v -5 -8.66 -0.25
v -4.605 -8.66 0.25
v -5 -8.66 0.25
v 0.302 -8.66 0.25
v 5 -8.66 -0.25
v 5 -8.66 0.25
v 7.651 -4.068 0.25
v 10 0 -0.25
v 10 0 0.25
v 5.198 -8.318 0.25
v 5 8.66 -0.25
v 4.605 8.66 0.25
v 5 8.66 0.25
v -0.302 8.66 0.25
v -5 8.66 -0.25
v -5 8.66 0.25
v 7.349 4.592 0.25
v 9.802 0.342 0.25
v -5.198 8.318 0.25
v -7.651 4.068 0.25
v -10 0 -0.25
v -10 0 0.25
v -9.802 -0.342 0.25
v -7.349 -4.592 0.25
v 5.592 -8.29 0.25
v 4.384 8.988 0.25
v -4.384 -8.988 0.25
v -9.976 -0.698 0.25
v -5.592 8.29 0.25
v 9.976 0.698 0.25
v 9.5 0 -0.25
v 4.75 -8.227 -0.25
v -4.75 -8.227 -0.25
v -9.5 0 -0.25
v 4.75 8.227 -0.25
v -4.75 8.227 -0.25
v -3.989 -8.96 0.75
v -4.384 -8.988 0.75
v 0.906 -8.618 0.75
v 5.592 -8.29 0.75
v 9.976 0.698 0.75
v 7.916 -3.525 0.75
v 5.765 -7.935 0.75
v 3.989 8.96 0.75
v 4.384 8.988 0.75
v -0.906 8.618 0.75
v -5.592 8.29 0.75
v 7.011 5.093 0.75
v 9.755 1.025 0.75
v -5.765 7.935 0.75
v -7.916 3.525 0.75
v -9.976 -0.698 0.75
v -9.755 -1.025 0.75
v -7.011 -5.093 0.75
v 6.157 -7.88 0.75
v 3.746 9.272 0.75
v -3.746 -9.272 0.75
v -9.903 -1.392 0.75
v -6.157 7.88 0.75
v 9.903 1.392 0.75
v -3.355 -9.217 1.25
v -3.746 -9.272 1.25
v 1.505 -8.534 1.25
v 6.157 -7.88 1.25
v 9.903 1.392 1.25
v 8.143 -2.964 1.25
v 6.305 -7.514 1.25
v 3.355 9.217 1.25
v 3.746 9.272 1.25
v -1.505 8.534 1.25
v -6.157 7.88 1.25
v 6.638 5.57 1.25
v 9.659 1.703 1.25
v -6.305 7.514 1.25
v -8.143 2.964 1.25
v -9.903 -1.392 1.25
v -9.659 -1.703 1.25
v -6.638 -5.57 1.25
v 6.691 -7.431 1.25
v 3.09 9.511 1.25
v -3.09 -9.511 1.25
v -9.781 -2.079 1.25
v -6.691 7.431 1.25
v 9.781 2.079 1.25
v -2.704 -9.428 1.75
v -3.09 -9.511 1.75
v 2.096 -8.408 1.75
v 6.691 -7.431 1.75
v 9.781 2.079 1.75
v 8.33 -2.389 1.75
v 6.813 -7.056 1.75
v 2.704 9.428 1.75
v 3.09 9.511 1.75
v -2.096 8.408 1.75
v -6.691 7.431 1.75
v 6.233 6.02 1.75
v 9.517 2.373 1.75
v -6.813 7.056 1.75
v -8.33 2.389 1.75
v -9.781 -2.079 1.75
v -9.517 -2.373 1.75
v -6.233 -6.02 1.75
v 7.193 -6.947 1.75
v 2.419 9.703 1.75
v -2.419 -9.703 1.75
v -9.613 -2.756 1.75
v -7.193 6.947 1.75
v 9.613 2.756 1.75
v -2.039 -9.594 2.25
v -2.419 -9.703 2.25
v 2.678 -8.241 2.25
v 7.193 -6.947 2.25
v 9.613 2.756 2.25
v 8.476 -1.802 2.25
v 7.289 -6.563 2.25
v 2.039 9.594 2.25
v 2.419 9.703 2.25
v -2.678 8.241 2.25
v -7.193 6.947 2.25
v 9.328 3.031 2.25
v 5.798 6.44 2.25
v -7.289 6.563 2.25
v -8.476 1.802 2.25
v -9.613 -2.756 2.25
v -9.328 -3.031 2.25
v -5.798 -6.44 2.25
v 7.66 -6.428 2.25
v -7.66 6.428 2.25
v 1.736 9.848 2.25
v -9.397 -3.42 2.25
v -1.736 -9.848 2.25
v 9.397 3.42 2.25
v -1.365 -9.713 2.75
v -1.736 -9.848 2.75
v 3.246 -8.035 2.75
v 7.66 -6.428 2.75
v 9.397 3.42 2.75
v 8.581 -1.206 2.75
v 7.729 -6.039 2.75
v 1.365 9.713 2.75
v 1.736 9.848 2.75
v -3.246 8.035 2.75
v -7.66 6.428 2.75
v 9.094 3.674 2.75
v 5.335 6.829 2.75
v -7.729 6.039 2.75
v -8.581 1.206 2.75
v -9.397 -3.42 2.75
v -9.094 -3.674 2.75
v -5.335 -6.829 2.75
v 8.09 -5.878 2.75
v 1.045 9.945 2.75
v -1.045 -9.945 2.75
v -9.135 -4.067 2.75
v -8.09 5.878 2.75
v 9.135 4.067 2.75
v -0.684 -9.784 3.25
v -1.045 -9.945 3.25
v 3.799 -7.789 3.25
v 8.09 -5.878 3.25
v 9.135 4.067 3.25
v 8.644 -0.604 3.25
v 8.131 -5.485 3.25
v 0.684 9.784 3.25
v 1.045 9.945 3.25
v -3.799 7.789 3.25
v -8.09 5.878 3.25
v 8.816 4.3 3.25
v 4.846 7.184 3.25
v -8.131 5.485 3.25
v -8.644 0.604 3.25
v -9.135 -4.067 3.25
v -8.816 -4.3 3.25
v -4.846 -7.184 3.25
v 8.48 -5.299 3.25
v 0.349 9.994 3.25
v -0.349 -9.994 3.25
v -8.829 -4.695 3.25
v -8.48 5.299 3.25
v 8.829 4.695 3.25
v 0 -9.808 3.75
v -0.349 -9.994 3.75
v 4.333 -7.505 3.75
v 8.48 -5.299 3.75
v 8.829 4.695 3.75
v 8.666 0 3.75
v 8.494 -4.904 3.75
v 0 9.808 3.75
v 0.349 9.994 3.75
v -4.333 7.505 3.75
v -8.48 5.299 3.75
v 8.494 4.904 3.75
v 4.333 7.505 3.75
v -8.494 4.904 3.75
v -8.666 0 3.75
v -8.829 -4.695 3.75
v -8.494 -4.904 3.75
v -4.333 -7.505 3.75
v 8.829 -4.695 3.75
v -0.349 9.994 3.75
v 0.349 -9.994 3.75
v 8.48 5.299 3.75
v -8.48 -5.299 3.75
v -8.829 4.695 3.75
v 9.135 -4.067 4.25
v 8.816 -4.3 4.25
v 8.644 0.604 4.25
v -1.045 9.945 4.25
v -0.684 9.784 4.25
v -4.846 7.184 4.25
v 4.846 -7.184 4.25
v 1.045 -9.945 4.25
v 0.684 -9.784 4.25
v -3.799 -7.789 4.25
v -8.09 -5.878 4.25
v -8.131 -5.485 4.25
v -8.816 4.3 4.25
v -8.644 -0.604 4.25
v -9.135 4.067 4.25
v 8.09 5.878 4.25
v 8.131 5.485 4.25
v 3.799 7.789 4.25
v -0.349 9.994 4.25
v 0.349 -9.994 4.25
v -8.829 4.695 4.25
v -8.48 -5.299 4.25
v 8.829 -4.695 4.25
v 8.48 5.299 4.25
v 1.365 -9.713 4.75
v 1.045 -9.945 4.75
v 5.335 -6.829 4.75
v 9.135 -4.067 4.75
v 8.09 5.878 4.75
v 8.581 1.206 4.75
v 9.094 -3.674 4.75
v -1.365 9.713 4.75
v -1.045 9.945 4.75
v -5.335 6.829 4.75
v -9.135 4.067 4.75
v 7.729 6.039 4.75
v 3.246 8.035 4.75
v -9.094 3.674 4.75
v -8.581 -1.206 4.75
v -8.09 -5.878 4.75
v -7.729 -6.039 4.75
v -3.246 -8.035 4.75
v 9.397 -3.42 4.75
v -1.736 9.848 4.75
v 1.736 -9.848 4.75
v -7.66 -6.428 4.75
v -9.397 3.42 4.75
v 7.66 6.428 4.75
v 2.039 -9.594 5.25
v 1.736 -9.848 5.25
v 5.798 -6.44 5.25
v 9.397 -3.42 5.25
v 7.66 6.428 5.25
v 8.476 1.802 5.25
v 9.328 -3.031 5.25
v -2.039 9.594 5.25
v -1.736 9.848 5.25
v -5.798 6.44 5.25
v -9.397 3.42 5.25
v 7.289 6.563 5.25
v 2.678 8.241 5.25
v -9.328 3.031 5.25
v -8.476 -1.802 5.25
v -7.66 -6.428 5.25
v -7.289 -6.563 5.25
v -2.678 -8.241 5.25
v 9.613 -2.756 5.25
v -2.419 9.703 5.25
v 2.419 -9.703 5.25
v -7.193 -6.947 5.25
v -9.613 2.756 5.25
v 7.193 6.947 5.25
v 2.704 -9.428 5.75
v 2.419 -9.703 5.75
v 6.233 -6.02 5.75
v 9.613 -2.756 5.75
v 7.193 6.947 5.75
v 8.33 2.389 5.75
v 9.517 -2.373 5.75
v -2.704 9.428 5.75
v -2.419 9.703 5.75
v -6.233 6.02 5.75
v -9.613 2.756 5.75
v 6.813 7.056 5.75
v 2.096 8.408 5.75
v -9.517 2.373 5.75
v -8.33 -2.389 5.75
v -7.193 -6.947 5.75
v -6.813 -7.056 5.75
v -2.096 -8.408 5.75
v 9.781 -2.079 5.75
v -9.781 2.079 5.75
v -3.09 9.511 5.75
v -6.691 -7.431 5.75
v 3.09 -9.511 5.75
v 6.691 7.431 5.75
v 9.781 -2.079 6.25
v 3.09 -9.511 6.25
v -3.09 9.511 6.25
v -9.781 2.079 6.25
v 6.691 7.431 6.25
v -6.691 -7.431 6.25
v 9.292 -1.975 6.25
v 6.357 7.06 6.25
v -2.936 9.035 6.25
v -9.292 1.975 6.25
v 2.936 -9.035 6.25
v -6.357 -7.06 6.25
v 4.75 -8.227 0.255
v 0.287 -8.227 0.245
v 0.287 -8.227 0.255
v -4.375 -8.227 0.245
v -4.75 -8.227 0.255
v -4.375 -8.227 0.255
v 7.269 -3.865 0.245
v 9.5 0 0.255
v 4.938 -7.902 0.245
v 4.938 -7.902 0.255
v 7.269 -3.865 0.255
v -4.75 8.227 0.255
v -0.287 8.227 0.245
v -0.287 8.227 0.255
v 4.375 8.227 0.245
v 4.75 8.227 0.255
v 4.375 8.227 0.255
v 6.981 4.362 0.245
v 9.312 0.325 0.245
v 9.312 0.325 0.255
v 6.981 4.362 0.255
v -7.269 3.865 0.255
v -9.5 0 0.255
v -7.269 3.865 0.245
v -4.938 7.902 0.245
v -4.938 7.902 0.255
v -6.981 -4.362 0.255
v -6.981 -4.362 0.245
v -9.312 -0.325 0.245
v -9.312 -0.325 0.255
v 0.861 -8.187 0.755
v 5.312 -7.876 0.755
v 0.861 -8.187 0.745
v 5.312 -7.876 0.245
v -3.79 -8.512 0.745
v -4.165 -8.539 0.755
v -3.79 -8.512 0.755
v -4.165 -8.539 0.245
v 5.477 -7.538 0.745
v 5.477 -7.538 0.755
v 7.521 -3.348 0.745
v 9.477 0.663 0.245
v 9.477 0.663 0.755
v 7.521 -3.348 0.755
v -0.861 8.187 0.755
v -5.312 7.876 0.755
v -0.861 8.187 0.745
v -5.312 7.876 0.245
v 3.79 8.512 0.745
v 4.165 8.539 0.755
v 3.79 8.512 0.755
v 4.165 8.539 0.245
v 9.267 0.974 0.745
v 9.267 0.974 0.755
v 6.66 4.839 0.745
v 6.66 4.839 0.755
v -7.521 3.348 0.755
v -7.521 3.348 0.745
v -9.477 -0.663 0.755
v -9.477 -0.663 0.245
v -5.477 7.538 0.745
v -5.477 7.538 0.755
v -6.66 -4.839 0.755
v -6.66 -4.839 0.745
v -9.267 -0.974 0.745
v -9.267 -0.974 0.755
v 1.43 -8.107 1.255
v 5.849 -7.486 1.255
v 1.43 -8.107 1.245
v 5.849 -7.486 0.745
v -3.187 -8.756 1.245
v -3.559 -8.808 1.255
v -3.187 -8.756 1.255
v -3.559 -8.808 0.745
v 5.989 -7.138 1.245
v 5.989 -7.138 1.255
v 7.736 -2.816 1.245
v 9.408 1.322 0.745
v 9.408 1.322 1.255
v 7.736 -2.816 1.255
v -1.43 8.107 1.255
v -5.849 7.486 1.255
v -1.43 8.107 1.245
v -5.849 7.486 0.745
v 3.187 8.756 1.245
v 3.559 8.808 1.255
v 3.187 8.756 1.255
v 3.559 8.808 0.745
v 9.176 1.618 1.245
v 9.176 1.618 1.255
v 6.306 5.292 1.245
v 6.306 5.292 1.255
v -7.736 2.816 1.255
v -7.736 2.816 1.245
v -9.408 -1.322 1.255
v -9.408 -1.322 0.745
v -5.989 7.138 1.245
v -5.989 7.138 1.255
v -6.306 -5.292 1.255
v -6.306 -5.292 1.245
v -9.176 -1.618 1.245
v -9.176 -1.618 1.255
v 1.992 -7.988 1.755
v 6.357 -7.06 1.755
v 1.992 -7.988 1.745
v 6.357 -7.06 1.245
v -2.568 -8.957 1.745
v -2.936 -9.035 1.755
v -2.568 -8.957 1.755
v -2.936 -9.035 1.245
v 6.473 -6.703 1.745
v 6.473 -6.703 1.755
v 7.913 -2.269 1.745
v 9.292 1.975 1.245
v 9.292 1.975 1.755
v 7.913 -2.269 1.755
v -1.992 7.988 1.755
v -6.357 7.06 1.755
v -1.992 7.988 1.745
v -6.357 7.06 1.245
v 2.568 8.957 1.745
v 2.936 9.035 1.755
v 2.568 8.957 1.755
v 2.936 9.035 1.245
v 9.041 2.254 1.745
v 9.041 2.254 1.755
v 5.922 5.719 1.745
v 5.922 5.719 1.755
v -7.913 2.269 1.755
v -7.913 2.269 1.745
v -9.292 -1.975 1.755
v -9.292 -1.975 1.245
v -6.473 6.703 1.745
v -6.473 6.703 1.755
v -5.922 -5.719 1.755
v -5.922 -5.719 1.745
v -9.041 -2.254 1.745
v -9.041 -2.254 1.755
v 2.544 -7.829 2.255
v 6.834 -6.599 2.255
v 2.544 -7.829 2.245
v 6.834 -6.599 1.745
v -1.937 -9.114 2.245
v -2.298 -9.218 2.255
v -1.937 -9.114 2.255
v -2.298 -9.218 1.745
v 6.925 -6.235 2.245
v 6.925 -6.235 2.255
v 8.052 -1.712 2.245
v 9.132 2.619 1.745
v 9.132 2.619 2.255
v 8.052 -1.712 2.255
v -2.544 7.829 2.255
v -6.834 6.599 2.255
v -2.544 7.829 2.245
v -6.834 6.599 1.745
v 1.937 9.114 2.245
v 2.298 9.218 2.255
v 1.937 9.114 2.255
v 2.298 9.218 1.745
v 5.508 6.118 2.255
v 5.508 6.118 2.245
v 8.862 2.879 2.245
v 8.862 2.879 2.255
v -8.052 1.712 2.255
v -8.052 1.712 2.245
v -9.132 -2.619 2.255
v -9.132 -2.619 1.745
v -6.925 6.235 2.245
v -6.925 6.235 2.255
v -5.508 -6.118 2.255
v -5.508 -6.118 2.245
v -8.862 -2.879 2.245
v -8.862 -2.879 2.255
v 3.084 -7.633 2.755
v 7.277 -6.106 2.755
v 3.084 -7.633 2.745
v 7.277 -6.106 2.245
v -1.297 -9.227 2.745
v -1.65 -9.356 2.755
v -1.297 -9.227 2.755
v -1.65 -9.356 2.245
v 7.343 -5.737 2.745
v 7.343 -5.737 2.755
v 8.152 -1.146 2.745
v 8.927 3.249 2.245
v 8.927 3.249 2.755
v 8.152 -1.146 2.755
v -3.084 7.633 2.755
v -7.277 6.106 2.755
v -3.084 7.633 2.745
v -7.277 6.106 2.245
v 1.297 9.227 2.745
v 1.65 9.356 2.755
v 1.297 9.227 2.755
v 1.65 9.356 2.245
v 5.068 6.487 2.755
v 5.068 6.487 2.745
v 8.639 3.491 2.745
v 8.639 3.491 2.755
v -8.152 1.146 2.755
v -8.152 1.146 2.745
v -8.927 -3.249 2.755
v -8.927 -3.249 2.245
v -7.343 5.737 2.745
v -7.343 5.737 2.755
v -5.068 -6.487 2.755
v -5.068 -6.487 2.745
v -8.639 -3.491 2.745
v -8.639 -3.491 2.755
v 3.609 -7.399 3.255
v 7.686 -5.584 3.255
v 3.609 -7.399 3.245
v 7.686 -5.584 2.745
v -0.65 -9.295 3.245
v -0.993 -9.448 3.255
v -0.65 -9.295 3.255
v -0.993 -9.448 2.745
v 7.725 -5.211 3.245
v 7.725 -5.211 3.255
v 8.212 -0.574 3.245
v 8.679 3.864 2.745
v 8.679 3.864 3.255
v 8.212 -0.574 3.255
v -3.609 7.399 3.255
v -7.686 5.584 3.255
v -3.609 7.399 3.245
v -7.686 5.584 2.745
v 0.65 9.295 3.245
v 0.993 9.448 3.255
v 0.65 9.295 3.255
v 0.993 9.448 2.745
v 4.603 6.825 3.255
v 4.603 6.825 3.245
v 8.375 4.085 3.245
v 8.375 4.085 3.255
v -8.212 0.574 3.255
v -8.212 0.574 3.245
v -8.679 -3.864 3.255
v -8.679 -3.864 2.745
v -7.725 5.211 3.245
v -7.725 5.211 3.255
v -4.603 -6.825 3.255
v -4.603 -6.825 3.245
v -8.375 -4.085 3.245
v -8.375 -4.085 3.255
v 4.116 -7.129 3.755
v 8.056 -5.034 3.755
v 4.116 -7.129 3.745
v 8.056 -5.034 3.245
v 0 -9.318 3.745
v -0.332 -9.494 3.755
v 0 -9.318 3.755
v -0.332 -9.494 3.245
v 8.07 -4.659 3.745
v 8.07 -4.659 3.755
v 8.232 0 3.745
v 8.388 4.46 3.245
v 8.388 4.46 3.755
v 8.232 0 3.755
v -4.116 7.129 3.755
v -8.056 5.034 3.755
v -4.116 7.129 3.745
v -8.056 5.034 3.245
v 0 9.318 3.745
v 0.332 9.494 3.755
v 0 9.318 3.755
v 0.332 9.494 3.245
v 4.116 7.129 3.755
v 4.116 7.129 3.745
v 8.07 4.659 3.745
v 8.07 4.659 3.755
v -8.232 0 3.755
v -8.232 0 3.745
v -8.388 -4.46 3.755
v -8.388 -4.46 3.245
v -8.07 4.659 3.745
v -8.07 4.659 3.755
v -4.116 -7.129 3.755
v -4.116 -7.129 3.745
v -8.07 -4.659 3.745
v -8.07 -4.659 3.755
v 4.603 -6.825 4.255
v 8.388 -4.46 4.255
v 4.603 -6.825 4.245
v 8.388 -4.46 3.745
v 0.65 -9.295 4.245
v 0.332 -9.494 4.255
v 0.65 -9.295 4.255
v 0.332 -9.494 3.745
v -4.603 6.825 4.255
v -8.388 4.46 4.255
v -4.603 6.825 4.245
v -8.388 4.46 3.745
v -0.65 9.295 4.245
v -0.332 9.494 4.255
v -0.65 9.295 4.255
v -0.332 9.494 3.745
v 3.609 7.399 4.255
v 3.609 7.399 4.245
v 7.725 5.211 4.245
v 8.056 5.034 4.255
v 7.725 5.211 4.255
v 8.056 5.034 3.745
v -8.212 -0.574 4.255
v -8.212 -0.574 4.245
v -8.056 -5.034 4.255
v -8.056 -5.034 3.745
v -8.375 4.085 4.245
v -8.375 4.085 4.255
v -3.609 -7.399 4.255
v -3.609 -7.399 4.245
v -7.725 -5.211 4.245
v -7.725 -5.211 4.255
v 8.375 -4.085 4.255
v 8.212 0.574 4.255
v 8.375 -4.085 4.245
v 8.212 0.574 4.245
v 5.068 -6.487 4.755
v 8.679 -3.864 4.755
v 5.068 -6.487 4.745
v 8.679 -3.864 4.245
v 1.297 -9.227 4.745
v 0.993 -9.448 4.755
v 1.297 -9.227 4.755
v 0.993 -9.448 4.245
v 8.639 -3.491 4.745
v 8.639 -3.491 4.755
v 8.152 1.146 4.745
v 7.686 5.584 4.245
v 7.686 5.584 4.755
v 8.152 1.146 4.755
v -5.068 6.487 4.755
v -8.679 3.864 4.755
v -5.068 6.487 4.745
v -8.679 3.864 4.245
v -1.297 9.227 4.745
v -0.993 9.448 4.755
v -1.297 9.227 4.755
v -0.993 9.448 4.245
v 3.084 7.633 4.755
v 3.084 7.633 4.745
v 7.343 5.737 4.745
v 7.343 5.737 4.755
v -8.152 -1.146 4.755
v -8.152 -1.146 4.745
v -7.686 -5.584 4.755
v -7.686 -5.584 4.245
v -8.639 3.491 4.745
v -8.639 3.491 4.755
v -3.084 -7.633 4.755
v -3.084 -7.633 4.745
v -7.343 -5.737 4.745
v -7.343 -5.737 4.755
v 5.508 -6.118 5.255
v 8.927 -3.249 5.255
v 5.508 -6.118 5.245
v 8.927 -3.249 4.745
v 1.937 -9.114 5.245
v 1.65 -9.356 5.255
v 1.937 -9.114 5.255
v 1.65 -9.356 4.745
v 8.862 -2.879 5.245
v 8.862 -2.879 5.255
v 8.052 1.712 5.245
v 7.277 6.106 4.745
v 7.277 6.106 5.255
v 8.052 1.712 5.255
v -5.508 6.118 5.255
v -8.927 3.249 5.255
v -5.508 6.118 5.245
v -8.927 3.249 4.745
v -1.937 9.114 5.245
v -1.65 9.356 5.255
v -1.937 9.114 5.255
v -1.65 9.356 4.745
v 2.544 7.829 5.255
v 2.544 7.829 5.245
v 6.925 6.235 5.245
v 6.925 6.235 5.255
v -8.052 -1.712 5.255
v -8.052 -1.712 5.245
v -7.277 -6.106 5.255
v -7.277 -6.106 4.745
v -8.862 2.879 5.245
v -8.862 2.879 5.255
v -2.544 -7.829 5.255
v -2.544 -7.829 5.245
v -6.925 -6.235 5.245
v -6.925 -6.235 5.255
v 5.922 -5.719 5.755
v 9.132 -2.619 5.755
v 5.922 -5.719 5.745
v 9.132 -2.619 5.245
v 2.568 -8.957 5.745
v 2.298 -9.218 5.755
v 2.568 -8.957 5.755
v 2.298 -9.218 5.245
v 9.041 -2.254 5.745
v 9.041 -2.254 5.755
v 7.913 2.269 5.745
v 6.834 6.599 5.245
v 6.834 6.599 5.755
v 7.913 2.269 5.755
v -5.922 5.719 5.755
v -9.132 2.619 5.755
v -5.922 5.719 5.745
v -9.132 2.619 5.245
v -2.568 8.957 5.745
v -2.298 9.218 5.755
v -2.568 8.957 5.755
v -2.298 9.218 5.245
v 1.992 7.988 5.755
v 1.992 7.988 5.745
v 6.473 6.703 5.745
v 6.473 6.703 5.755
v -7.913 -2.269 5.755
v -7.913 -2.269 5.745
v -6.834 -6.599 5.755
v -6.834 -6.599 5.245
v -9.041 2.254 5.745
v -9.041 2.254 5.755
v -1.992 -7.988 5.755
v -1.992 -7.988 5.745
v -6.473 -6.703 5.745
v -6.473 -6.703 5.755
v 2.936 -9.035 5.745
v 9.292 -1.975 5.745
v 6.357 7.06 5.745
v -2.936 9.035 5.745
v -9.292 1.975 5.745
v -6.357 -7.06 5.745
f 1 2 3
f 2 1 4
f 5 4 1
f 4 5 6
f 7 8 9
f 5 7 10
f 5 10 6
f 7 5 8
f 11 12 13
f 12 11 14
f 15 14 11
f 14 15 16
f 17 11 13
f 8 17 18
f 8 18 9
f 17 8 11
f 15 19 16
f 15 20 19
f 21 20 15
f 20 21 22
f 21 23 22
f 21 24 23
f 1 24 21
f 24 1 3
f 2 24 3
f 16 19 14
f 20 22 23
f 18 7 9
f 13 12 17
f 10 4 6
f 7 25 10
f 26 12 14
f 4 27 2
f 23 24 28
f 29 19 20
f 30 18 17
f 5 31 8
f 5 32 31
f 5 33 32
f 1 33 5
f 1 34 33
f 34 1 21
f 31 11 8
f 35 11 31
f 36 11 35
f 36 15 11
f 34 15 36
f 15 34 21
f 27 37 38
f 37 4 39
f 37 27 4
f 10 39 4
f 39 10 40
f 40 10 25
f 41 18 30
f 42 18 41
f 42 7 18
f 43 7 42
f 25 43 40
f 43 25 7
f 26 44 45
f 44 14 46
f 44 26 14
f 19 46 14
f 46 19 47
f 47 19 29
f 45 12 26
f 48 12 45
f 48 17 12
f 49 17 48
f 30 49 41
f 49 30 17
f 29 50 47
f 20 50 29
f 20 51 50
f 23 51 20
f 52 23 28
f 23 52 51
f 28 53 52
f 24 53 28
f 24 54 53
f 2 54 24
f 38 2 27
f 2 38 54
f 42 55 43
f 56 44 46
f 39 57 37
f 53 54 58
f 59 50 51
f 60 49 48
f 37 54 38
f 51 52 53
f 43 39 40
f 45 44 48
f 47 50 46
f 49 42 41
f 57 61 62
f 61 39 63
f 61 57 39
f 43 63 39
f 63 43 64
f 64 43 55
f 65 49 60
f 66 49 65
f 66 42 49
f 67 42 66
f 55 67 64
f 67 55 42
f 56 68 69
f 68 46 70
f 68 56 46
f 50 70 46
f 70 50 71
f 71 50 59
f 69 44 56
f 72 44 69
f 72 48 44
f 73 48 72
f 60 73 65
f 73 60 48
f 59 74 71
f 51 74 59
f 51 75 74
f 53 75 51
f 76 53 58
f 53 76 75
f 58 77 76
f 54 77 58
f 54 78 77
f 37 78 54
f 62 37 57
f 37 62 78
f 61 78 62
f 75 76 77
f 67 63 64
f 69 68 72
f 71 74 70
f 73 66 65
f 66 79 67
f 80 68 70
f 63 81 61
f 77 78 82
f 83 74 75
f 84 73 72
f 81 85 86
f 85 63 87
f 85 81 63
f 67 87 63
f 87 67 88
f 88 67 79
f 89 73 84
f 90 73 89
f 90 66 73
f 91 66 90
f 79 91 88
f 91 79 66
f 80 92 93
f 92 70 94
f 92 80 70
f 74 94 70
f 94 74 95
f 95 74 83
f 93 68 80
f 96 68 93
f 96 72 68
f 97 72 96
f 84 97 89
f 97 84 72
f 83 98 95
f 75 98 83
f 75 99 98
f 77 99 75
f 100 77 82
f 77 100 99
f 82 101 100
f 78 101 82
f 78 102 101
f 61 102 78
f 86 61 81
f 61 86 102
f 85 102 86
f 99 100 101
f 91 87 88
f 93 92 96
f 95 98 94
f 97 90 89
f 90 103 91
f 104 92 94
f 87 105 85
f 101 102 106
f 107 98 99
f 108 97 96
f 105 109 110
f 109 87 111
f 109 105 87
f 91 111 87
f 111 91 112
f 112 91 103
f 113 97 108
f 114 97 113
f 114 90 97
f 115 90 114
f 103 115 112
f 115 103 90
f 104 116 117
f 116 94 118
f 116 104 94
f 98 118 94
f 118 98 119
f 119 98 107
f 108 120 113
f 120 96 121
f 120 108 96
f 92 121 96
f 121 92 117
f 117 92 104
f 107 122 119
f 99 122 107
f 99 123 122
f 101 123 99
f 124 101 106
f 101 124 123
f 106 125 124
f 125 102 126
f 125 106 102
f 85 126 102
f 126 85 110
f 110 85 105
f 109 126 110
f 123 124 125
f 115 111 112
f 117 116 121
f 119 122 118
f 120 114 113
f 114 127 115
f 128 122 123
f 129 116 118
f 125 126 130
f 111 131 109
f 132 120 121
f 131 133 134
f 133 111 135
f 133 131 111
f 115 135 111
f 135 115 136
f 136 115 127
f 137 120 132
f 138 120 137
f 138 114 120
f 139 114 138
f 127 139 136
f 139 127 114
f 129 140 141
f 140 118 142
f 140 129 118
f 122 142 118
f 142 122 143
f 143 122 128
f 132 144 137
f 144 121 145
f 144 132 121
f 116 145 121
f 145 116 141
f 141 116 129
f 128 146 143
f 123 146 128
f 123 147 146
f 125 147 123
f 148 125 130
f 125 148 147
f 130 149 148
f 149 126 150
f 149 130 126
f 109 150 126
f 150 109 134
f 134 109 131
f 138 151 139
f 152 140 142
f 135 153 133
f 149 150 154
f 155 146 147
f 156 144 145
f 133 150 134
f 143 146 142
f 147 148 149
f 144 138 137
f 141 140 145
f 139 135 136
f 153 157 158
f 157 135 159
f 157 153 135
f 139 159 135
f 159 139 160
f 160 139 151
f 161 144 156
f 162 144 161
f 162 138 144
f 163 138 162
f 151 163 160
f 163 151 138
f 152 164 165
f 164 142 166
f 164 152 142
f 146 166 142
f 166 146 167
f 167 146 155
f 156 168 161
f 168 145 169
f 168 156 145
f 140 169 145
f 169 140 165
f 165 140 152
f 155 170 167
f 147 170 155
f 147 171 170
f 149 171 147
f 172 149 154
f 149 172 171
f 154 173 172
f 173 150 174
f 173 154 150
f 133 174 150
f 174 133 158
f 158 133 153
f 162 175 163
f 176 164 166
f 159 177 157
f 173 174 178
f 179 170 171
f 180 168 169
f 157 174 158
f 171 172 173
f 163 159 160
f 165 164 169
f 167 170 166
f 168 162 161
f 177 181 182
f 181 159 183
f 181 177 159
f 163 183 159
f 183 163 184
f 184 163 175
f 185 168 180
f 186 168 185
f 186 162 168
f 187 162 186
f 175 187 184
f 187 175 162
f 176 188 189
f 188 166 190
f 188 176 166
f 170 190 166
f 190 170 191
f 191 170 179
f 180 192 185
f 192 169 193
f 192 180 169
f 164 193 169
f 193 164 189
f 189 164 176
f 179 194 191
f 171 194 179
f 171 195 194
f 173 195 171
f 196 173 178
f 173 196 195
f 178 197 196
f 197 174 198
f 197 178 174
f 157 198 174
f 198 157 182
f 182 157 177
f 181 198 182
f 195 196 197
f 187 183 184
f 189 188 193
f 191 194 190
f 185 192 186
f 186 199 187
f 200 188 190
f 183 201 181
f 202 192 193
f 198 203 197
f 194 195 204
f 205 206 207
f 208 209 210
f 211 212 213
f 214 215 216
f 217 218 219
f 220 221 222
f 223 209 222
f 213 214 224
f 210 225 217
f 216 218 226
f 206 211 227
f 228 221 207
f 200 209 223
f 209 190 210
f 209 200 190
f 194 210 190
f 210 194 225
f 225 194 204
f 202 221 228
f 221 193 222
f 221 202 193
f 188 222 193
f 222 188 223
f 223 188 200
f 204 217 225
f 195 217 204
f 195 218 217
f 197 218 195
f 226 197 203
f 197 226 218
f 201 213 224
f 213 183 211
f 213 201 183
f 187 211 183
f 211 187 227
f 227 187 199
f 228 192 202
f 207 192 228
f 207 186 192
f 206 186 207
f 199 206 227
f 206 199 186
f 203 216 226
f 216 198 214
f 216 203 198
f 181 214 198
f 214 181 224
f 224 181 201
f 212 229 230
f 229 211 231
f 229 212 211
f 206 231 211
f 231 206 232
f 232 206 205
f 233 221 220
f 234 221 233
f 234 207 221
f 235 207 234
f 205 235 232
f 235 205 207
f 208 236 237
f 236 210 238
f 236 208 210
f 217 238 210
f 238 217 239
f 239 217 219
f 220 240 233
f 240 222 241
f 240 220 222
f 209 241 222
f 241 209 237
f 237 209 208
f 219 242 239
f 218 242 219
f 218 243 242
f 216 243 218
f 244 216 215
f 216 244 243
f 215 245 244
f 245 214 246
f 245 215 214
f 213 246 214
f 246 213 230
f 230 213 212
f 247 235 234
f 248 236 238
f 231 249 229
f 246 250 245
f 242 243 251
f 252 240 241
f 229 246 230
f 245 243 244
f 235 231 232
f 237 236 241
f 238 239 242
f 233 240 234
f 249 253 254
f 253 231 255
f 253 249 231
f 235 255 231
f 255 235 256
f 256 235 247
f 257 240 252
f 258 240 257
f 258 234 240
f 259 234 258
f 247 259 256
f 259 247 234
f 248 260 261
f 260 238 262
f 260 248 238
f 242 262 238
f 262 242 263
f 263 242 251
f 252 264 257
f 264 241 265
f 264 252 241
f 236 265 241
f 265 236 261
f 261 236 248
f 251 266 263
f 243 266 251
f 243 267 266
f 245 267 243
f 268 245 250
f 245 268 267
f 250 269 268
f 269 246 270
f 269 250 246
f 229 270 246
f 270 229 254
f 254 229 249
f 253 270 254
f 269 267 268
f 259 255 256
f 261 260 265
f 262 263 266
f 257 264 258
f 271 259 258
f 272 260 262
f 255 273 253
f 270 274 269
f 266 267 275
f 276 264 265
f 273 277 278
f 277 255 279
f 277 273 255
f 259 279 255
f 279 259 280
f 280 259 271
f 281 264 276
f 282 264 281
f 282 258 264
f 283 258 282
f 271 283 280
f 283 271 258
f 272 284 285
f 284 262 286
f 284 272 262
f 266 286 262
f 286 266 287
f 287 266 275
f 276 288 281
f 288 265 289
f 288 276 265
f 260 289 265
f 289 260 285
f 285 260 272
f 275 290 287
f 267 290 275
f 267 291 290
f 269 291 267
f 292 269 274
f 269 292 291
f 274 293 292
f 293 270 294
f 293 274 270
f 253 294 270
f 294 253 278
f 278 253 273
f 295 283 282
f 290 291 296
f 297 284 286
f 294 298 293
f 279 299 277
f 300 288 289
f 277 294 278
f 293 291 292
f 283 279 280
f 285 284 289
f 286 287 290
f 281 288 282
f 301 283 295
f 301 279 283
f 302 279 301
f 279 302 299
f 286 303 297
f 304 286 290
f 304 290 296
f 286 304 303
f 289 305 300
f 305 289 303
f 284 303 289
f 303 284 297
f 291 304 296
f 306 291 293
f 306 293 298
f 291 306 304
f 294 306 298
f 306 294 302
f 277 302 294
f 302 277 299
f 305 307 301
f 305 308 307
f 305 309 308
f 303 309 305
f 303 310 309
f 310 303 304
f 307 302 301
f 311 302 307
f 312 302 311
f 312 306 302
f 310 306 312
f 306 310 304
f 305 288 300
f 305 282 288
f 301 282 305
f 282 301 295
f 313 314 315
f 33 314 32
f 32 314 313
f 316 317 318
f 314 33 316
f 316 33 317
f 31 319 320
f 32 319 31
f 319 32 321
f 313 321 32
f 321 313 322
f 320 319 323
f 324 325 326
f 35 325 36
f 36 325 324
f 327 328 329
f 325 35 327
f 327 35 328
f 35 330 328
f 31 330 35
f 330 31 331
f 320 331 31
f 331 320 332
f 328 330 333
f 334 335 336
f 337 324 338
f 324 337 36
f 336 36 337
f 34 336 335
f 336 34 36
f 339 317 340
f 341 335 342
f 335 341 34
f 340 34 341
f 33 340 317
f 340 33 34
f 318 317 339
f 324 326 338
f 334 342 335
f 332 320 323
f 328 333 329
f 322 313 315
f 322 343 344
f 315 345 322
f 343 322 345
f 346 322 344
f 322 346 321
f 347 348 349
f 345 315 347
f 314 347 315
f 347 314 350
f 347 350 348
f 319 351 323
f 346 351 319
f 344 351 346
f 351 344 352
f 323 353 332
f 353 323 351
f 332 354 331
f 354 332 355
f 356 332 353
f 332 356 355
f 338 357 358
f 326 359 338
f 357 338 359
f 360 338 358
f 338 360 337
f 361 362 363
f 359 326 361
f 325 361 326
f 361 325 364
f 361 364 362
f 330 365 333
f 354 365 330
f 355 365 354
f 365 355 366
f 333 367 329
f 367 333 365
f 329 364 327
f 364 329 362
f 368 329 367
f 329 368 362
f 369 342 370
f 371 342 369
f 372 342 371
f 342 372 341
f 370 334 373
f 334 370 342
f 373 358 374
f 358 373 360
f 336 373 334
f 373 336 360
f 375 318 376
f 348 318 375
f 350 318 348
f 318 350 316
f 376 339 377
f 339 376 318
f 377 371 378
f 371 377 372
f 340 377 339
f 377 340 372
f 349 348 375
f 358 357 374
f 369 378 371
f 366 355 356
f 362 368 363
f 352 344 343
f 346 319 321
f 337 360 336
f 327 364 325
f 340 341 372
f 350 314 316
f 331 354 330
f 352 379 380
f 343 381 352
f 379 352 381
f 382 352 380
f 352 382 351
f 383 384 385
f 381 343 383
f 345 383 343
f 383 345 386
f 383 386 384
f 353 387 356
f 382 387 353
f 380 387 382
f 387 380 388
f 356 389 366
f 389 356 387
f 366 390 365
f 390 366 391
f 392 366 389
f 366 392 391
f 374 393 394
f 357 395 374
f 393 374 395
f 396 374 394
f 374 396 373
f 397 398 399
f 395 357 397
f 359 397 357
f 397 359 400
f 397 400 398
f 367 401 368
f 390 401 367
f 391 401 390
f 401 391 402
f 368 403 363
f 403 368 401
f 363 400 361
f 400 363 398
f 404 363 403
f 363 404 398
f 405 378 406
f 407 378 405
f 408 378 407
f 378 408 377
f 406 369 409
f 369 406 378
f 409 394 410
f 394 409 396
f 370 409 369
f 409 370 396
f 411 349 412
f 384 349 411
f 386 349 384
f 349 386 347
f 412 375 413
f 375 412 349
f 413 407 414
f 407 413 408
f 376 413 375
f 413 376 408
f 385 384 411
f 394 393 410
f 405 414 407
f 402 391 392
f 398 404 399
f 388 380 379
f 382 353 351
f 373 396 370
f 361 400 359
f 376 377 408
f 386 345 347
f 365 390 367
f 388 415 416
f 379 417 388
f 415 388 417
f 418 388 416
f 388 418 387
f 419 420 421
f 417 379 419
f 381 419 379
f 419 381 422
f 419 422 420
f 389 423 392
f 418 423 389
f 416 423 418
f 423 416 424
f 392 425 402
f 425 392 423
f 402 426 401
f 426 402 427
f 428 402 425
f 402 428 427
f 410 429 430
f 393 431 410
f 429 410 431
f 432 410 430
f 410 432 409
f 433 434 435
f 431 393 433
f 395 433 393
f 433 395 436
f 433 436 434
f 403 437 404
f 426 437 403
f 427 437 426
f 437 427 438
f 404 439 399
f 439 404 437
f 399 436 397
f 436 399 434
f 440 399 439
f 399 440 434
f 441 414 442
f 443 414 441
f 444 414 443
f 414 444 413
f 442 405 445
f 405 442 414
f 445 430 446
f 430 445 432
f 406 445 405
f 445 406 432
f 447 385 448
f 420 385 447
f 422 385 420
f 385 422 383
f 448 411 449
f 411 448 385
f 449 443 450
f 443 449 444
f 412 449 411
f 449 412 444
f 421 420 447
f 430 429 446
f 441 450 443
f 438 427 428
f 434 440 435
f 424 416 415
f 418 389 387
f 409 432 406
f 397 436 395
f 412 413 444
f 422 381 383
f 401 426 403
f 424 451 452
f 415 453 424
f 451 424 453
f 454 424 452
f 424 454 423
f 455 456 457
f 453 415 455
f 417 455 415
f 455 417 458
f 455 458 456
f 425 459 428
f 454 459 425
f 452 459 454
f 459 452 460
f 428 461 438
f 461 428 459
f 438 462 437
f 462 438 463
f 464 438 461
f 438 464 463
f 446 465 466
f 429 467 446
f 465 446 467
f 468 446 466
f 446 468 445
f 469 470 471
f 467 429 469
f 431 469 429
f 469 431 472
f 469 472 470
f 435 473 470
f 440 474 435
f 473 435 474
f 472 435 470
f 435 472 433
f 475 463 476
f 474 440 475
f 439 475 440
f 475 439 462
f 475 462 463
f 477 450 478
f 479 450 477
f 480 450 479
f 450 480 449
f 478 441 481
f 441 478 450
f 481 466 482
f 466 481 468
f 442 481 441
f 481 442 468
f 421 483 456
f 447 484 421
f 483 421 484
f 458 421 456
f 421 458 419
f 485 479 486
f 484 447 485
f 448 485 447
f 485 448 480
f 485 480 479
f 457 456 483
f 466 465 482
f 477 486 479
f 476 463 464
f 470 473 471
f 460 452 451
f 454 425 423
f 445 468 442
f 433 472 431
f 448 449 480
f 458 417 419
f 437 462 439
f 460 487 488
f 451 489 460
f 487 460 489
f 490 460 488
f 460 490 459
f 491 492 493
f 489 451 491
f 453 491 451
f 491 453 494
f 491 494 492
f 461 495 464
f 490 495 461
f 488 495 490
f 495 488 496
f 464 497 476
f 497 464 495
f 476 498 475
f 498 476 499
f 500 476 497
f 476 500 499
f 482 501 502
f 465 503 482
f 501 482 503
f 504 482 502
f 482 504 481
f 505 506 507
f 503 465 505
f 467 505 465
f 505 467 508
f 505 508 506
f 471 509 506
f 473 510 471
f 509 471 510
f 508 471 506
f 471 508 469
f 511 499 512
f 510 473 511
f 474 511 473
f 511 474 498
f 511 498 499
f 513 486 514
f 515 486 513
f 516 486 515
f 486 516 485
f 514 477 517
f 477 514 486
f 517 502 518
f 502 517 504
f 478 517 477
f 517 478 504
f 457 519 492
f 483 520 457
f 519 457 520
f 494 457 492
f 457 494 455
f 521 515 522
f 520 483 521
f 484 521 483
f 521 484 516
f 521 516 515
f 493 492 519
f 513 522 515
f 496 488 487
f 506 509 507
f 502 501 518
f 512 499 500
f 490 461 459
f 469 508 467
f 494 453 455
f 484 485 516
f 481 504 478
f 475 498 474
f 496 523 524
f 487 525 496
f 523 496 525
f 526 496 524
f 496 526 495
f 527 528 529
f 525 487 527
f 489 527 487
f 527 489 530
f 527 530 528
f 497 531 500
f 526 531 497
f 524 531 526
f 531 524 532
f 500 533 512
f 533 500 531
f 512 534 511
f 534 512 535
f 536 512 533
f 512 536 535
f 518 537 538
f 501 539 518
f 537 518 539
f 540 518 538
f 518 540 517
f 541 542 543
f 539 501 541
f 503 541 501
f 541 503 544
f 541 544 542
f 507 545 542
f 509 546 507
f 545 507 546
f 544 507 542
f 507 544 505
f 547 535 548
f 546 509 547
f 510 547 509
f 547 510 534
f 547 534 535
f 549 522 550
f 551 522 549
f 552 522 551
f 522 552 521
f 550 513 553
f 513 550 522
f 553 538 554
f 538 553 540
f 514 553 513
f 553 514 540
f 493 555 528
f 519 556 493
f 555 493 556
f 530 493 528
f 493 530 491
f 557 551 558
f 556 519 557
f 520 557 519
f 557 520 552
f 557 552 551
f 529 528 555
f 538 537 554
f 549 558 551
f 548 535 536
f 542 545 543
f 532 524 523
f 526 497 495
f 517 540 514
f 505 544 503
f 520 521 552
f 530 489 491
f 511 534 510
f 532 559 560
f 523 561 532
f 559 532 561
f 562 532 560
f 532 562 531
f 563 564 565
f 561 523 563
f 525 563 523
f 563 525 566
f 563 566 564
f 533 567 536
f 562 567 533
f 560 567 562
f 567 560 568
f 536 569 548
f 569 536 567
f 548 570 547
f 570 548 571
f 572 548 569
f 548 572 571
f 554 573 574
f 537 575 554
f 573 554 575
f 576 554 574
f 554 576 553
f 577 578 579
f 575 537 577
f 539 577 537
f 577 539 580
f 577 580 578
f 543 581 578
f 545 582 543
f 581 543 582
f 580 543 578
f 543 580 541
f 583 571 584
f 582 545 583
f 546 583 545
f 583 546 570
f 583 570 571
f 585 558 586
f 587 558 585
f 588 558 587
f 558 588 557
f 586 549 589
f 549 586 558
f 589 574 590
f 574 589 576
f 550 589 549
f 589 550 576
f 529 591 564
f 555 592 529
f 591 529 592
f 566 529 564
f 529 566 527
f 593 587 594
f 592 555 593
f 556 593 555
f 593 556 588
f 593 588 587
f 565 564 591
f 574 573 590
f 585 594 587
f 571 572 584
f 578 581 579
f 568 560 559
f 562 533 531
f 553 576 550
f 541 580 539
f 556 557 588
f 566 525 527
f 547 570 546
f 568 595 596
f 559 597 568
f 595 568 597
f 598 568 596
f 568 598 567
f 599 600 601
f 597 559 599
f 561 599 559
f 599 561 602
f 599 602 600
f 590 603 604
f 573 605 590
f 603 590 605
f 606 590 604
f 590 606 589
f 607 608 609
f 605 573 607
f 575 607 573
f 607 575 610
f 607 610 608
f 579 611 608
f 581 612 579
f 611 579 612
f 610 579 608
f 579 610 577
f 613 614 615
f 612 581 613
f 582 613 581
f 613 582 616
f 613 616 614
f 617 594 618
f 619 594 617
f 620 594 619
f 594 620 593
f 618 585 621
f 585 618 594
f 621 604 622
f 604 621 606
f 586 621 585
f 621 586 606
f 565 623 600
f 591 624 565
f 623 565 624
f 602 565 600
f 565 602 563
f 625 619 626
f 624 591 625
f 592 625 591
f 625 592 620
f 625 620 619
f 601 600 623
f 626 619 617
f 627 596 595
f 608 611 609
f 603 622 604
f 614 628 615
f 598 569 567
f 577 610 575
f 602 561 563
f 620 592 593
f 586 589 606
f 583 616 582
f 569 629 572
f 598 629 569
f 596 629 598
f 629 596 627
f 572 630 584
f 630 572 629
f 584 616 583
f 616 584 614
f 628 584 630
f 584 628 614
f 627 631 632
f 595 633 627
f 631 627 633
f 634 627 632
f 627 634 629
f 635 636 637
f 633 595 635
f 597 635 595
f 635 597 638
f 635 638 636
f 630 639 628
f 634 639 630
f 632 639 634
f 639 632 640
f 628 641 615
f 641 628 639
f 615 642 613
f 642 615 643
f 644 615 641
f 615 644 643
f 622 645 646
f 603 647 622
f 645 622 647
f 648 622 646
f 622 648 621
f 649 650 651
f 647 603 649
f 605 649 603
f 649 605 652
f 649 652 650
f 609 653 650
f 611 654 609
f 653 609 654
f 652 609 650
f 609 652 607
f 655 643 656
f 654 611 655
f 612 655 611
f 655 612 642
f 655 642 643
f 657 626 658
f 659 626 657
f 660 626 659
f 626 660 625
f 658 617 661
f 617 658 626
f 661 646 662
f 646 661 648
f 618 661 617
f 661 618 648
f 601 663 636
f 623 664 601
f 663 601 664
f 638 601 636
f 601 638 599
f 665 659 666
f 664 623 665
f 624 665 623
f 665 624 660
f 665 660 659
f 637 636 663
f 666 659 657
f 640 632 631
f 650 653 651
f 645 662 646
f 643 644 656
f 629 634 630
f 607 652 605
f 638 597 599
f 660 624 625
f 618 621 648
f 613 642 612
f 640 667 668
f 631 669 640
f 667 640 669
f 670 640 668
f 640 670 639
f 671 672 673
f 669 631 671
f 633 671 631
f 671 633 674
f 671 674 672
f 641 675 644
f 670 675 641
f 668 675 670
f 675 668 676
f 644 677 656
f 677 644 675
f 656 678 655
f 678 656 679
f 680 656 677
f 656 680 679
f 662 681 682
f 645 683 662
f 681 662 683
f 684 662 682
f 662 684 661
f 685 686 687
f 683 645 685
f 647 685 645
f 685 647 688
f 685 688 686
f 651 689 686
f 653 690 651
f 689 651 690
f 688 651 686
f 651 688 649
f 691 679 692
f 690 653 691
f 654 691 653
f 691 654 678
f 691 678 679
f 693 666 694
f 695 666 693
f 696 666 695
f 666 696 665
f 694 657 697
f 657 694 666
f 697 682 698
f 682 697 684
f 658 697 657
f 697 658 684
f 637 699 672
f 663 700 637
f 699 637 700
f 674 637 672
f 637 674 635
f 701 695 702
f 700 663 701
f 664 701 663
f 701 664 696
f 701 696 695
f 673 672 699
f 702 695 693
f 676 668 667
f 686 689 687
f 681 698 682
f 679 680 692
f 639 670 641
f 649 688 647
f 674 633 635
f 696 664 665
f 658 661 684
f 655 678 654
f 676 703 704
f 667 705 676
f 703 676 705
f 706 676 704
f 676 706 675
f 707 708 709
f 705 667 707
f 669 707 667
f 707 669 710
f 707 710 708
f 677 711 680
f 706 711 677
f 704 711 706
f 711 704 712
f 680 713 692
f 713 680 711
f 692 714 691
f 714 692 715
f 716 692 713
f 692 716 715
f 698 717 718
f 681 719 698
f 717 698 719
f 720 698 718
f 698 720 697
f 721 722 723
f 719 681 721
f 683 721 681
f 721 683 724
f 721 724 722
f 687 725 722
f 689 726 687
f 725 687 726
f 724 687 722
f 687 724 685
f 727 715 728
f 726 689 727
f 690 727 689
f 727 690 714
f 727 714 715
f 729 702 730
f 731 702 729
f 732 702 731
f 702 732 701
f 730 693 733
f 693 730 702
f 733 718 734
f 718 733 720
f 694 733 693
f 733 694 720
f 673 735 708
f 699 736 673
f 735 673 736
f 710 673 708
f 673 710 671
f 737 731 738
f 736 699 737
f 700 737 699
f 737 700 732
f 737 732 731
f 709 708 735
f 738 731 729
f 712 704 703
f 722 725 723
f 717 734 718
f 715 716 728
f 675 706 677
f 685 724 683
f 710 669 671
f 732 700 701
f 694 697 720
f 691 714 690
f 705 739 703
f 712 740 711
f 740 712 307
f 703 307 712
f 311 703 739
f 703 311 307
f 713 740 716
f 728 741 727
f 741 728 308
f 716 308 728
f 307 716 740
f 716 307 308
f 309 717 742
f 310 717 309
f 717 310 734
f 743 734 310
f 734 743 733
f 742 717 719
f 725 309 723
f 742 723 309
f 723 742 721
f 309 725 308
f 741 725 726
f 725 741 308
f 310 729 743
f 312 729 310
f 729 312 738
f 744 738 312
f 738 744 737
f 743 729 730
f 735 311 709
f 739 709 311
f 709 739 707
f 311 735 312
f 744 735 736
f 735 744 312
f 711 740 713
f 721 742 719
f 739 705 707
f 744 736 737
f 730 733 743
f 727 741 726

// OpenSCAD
difference() {
	for ( i = [0 : 1 : 12])
	{
	    rotate(i * 4, [0, 0, i])
	    translate([0, 0, i*.5])
	    cylinder(h = .5, r=10, $fn = 6, center = true);
	}

	for ( i = [0 : 1 : 12])
	{
	    rotate(i * 4, [0, 0, i])
	    translate([0, 0, i*.5])
	    cylinder(h = .51, r=9.5, $fn = 6, center = true);
	}

}
